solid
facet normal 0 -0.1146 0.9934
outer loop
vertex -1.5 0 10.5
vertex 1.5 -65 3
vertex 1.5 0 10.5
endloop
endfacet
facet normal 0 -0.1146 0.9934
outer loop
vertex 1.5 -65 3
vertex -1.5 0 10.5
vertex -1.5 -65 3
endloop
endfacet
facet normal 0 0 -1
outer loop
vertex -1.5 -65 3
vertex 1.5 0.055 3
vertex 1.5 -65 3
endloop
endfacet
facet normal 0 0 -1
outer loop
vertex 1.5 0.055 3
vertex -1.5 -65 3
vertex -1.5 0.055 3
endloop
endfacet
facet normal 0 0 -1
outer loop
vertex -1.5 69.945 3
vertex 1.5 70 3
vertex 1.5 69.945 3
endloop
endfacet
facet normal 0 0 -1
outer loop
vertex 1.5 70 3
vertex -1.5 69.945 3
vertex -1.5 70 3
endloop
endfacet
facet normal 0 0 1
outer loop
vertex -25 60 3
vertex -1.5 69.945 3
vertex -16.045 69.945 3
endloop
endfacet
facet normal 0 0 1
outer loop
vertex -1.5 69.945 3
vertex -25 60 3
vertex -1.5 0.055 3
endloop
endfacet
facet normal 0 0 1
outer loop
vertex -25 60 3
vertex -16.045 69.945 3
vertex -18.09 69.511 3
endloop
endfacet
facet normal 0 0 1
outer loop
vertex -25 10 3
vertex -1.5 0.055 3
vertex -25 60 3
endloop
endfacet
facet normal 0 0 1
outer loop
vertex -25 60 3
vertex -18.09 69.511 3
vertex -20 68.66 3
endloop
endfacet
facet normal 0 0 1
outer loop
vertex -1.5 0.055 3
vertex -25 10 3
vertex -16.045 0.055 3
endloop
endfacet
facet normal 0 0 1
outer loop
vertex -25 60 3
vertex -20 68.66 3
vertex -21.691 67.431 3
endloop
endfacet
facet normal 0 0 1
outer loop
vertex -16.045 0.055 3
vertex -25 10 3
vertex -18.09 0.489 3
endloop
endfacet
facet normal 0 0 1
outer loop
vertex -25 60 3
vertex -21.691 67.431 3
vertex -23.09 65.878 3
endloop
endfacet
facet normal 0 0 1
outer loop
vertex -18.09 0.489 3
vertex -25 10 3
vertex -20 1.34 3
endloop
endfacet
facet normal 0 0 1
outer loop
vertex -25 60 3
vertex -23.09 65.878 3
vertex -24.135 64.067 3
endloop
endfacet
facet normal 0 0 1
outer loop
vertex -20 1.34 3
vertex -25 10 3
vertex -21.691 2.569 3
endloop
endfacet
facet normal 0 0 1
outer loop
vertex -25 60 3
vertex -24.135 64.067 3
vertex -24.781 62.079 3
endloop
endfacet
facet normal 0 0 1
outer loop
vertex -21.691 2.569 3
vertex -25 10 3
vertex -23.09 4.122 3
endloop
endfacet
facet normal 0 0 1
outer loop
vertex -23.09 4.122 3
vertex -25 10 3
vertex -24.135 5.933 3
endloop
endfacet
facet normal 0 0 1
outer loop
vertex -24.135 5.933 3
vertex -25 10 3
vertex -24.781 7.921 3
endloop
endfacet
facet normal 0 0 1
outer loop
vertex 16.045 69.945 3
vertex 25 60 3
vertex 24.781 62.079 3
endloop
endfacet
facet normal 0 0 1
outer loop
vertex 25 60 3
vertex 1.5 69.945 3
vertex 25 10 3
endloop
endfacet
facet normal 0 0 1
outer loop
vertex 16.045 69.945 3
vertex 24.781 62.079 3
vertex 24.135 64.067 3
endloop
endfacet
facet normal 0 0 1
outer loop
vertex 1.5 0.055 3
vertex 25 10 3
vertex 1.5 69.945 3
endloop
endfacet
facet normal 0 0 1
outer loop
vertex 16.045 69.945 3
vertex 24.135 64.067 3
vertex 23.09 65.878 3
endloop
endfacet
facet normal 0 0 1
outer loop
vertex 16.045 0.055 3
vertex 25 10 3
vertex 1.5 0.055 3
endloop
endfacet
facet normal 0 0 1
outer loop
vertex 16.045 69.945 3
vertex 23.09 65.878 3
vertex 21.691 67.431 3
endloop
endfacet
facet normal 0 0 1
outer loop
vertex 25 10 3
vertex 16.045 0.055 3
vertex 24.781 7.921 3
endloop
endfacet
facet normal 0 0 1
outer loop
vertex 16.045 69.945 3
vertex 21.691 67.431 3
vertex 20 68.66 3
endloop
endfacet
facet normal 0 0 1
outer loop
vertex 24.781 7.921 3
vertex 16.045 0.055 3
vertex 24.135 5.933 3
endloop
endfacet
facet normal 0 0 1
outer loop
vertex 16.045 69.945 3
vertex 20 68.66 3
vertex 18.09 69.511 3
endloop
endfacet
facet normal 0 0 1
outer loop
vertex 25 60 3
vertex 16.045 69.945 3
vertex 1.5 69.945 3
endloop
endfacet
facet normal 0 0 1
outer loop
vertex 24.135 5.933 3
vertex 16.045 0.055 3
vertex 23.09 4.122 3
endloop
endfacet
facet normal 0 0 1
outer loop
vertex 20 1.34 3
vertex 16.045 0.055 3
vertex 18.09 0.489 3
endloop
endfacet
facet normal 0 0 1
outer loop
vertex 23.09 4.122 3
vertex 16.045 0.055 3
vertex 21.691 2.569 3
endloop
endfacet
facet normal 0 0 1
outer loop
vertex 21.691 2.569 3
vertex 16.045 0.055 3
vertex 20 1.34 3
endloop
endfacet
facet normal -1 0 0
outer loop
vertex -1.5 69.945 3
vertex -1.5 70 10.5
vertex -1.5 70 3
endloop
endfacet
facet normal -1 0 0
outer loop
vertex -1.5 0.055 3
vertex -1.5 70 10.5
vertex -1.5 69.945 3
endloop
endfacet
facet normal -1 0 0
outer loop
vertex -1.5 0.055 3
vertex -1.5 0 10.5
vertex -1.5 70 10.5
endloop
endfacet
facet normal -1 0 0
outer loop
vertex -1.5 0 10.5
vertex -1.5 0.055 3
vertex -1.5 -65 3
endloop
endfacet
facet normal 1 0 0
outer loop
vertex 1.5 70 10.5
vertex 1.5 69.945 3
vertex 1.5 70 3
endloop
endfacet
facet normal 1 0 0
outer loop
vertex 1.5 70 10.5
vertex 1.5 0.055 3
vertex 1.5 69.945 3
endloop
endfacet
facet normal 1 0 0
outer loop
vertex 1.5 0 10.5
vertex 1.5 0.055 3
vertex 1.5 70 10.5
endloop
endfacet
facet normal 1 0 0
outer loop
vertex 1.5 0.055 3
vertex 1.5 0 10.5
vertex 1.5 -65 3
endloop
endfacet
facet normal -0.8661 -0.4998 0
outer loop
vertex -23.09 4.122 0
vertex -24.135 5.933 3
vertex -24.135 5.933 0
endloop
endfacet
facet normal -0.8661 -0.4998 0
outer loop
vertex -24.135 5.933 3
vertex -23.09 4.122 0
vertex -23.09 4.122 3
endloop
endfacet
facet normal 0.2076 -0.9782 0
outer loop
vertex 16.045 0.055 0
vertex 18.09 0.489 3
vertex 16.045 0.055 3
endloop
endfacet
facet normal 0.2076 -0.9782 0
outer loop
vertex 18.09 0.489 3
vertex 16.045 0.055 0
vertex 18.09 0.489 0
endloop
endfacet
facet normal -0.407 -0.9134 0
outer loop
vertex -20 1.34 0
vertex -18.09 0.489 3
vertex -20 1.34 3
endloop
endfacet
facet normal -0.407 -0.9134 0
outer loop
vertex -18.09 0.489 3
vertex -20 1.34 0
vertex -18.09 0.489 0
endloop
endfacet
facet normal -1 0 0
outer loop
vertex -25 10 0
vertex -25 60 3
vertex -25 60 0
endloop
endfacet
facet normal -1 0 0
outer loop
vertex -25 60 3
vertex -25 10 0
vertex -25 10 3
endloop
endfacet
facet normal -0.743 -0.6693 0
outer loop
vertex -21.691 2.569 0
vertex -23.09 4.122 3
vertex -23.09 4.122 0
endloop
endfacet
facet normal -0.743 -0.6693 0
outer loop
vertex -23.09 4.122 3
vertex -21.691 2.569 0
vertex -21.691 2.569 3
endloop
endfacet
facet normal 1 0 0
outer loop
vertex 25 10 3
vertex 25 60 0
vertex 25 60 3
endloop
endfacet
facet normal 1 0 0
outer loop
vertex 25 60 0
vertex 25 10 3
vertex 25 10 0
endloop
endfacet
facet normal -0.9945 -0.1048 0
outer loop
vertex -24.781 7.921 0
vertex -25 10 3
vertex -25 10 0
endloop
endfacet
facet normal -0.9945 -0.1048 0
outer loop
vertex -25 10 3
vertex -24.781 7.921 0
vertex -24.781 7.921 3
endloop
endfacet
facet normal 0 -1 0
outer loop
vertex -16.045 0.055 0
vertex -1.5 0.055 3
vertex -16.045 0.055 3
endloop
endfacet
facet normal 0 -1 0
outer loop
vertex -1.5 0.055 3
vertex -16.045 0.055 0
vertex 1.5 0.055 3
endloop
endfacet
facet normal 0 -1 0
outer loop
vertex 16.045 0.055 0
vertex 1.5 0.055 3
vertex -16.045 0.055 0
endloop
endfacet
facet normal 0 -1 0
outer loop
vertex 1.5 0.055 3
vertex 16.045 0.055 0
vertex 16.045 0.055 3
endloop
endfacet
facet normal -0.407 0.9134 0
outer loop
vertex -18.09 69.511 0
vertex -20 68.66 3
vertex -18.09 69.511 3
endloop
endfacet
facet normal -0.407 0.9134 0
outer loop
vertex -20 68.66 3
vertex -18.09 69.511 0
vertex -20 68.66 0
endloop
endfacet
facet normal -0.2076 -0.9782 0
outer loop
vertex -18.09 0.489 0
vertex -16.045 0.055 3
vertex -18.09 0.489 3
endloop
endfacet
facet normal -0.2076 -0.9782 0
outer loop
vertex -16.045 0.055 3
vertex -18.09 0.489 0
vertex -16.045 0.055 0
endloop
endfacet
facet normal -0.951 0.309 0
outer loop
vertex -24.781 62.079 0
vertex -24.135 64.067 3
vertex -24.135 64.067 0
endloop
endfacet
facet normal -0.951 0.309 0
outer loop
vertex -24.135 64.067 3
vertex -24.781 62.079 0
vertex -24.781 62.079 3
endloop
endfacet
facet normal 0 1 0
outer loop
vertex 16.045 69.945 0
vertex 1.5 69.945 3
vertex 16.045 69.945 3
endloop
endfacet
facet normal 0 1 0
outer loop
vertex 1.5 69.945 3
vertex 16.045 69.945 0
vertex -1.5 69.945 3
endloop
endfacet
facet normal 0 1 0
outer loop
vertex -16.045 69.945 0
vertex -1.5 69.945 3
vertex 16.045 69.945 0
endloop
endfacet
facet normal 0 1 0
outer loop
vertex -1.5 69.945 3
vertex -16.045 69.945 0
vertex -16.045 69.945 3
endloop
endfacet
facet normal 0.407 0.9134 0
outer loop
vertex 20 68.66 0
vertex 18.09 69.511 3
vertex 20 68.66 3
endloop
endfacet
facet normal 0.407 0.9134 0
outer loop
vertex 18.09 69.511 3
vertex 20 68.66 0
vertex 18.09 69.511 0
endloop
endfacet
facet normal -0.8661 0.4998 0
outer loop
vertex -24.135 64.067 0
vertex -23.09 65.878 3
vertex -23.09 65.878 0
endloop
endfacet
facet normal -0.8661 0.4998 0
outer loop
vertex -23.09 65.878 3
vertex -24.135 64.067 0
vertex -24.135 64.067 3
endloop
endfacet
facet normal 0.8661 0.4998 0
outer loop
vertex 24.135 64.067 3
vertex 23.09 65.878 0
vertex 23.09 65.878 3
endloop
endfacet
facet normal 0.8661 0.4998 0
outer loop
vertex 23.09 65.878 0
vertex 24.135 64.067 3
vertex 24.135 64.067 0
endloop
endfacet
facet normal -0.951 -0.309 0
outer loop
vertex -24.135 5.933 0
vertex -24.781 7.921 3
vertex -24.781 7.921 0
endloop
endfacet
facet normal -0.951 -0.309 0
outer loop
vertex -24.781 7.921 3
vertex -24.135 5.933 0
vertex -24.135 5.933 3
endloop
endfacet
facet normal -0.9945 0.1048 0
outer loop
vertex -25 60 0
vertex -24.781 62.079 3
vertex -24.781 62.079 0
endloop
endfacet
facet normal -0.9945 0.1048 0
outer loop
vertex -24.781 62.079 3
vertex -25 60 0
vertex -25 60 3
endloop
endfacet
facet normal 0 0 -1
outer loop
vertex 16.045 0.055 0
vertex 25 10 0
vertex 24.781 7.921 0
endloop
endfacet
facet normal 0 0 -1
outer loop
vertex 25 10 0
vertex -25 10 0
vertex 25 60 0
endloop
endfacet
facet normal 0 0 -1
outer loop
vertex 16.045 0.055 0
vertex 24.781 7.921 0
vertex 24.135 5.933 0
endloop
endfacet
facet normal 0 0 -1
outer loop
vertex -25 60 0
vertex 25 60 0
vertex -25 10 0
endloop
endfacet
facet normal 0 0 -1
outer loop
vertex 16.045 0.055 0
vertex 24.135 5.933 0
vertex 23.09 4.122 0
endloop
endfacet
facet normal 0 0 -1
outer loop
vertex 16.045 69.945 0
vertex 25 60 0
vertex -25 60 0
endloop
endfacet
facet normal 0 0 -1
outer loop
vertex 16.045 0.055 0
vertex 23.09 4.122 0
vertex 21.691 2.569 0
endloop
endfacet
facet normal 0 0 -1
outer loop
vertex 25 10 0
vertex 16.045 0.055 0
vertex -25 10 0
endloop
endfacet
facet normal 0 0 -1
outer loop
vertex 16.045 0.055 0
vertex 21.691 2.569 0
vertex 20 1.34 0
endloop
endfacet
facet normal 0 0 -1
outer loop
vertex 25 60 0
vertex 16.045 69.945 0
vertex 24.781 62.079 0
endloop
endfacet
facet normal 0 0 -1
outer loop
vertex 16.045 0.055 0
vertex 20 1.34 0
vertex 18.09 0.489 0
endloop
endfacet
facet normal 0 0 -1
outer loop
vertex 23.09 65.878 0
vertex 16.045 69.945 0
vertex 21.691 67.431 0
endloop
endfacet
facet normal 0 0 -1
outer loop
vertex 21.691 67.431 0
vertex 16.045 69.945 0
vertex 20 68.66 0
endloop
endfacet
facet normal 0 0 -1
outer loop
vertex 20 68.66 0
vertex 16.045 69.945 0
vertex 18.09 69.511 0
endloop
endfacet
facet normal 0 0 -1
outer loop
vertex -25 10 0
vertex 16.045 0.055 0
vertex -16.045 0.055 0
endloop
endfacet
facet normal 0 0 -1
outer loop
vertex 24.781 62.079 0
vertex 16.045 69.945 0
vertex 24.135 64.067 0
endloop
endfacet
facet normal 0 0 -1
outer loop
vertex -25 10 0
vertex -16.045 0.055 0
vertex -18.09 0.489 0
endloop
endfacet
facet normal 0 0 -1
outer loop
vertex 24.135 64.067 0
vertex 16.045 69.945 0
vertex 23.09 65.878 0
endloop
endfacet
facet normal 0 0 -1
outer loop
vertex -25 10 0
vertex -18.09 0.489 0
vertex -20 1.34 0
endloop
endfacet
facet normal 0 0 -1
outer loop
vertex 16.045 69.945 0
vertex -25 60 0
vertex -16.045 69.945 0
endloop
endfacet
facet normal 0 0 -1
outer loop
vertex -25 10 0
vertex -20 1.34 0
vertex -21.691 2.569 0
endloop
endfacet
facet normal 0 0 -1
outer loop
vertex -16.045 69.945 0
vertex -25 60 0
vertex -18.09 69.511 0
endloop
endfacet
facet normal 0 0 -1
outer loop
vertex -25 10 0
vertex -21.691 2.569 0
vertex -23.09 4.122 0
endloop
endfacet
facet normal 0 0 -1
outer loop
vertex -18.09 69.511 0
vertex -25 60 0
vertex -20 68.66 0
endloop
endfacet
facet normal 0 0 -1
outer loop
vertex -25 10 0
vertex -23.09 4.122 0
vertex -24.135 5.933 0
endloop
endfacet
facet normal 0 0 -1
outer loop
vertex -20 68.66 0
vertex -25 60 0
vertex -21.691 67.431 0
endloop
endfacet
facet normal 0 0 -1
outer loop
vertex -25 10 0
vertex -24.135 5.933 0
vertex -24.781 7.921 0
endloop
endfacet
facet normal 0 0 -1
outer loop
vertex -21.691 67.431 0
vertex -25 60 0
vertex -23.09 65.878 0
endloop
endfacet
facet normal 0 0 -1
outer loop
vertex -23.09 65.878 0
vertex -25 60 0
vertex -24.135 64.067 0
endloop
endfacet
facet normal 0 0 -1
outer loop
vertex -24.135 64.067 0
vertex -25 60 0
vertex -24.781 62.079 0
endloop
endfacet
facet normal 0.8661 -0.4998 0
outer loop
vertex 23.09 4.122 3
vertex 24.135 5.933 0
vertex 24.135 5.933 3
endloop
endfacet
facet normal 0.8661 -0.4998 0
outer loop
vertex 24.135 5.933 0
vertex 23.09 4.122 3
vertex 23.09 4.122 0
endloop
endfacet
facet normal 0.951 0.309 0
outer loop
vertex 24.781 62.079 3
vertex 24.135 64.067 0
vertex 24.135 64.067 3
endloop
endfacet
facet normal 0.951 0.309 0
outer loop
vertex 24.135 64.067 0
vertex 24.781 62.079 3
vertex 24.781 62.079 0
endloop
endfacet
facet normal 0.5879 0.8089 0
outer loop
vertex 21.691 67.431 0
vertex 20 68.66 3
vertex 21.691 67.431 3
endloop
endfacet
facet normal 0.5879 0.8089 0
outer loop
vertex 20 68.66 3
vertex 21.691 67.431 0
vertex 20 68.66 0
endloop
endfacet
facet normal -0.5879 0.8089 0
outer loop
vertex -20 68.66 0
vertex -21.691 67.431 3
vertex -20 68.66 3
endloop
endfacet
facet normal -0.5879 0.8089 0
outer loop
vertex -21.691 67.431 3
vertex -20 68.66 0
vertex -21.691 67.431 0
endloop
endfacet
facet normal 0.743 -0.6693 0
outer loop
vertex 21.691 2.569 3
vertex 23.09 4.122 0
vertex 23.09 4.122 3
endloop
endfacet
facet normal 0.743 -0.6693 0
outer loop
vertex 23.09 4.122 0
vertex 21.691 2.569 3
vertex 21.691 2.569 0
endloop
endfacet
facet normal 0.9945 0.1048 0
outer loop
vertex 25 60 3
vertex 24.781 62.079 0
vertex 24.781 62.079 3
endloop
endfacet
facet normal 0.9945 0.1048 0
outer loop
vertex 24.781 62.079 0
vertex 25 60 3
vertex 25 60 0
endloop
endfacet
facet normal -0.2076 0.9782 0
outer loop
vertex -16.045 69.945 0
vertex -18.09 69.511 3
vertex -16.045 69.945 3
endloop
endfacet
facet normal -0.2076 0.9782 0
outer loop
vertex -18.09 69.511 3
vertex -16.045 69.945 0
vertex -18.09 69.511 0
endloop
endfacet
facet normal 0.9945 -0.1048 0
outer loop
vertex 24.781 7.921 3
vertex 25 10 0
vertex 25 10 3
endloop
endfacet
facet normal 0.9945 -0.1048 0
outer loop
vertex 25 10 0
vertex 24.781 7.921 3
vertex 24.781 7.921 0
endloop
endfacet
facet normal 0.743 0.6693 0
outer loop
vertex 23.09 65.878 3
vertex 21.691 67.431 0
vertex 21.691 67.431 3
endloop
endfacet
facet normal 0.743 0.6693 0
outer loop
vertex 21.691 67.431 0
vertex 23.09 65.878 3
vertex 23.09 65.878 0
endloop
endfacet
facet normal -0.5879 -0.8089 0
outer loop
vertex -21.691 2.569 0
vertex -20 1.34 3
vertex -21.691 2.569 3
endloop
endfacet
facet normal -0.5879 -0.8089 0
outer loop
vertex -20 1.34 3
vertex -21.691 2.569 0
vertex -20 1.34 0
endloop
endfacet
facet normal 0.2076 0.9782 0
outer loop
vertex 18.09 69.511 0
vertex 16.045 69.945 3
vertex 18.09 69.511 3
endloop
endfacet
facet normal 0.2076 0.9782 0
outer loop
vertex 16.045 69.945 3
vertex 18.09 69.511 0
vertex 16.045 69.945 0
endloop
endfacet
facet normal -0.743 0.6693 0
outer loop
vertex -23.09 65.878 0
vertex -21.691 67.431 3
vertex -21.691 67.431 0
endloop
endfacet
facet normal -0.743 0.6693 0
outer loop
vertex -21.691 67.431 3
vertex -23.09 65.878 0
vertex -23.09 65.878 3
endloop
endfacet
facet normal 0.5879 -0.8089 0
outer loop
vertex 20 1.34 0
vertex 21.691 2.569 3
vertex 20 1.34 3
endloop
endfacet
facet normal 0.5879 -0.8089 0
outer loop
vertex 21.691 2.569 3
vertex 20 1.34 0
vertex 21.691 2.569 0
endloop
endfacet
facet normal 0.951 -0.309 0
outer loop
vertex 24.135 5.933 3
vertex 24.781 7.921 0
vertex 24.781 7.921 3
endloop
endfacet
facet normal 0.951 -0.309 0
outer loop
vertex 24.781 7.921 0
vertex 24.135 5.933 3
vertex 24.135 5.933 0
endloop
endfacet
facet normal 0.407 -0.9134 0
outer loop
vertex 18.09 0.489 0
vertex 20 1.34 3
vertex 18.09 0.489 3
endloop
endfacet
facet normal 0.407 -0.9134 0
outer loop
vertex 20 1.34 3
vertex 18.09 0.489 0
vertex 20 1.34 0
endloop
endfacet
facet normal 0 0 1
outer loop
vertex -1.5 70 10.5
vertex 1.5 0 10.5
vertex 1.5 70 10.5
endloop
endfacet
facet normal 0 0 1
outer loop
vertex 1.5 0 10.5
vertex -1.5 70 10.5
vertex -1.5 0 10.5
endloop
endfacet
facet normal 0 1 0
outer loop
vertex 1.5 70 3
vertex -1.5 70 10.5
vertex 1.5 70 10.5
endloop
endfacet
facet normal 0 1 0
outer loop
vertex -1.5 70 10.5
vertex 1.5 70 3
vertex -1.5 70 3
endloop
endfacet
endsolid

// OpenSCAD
plate_height = 70;
plate_width = 50;
plate_radius = 10;

thron_size = 80;
thron_height = 7.5;
thron_width = 15;
thron_thickness = 3;

module thron() {
	bottom_points = [
		[thron_width/2, thron_size, 0],
		[thron_width/2, thron_size, thron_thickness],
		[thron_width/-2, thron_size, thron_thickness],
		[thron_width/-2, thron_size, 0],
		[0, 0, 0],
		[0, 5, thron_thickness],
	];

	bottom_faces = [[0,1,2,3],[5,4,3,2],[0,4,5,1],[0,3,4],[5,2,1]];

	top_points = [
		[thron_thickness/2, thron_size, thron_height+thron_thickness],
		[thron_thickness/-2, thron_size, thron_height+thron_thickness],
		[thron_thickness/-2, thron_size, thron_thickness],
		[thron_thickness/2, thron_size, thron_thickness],
		[thron_thickness/2, 15, thron_thickness],
		[thron_thickness/-2, 15, thron_thickness]
	];

	top_faces = [[0,1,2,3],[5,4,3,2],[0,4,5,1],[0,3,4],[5,2,1]];

	polyhedron(top_points, top_faces);
	polyhedron(bottom_points, bottom_faces);
}
echo(thron_thickness);

translate([(plate_width-plate_radius*2)/-2, plate_radius, 0]) {
	minkowski() {
		cube([plate_width-plate_radius*2, plate_height-plate_radius*2, thron_thickness/2]);
		cylinder(r=plate_radius, h=thron_thickness/2);
	}
}
translate([0, -thron_size, 0]) thron();
translate([thron_thickness/-2, 0, thron_thickness]) cube([thron_thickness, plate_height, thron_height]);
